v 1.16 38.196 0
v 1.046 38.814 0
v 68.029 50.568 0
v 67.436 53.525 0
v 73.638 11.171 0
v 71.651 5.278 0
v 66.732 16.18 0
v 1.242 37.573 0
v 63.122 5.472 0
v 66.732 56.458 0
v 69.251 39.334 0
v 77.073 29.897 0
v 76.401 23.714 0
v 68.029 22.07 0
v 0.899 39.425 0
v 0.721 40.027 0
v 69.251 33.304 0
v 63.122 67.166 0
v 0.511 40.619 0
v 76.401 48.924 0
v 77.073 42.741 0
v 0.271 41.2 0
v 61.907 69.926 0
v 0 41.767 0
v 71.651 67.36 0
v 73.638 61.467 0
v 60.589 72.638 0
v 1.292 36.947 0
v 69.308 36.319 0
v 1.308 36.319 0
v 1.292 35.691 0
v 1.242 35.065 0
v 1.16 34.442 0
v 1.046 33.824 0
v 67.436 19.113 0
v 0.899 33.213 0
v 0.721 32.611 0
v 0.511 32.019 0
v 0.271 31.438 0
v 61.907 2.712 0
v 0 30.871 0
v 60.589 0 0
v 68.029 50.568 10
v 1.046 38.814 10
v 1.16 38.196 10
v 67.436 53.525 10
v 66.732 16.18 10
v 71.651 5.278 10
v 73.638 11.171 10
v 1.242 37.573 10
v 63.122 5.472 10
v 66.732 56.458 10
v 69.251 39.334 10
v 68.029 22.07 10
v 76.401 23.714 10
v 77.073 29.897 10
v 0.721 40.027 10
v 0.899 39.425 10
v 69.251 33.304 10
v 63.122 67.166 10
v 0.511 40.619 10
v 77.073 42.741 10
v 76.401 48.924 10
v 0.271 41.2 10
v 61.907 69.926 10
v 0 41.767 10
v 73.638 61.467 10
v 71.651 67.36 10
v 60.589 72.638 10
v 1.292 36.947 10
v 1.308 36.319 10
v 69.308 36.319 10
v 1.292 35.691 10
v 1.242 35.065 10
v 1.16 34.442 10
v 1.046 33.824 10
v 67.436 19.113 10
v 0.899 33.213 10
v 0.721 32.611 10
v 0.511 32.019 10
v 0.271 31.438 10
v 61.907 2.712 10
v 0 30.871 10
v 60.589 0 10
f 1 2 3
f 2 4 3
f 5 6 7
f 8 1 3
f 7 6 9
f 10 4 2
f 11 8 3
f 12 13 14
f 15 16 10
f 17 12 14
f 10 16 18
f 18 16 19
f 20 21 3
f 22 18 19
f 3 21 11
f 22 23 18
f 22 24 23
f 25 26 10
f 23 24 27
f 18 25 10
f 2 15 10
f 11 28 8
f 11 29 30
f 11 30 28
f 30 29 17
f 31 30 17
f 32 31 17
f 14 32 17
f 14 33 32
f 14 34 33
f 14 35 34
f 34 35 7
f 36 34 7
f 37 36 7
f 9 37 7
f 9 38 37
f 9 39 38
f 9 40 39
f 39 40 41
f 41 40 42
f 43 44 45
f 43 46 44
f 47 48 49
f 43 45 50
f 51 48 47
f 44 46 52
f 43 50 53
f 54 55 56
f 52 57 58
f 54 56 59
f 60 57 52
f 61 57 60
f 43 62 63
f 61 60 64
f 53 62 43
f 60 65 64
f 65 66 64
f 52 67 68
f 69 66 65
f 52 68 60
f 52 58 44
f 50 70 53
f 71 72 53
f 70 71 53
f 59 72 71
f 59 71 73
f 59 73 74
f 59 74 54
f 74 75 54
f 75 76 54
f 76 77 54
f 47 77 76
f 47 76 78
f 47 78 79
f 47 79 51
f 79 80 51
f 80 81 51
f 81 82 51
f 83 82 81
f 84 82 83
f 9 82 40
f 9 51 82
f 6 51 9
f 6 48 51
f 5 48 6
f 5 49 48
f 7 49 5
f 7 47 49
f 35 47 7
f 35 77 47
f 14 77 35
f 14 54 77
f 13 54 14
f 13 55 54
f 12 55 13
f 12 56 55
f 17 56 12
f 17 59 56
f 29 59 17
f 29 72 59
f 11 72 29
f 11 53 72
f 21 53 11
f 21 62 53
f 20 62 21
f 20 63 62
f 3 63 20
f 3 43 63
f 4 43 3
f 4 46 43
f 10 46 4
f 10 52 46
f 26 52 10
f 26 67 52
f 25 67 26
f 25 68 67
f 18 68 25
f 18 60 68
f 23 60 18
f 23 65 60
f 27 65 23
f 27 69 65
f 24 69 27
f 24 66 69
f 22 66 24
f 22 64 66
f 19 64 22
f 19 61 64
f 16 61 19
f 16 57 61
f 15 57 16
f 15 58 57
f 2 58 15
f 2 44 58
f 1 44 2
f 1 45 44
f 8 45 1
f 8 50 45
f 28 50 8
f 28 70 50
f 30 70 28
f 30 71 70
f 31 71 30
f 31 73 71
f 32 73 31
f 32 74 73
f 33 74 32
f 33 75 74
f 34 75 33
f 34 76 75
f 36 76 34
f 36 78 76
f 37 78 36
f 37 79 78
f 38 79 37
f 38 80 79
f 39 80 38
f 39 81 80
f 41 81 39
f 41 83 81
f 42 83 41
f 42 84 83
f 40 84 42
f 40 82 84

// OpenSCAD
$fn = 32;

// ----------------------------------------------------------------------
// Gear sector: 4 teeth on 54 degrees
// ----------------------------------------------------------------------

// --- parameters (mm) ---
sector_angle = 54;        // sector angle, degrees
root_r = 80;              // root circle radius
tooth_h = 8;              // tooth height over the root circle
teeth = 4;                // number of teeth on the sector
hub_r = 12;               // hub bore radius
plate_t = 10;             // sector thickness, Z
arc_step = 3;             // sampling step of the root/hub arcs, degrees

tip_r = root_r + tooth_h;  // tip circle radius

profile = [[60.589, 0], [61.907, 2.712], [63.122, 5.472], [71.651, 5.278], [73.638, 11.171], [66.732, 16.18], [67.436, 19.113], [68.029, 22.07], [76.401, 23.714], [77.073, 29.897], [69.251, 33.304], [69.308, 36.319], [69.251, 39.334], [77.073, 42.741], [76.401, 48.924], [68.029, 50.568], [67.436, 53.525], [66.732, 56.458], [73.638, 61.467], [71.651, 67.36], [63.122, 67.166], [61.907, 69.926], [60.589, 72.638], [0, 41.767], [0.271, 41.2], [0.511, 40.619], [0.721, 40.027], [0.899, 39.425], [1.046, 38.814], [1.16, 38.196], [1.242, 37.573], [1.292, 36.947], [1.308, 36.319], [1.292, 35.691], [1.242, 35.065], [1.16, 34.442], [1.046, 33.824], [0.899, 33.213], [0.721, 32.611], [0.511, 32.019], [0.271, 31.438], [0, 30.871]];  // primary outline, 42 points, counter clockwise

// --- the one profile operation ---
linear_extrude(height = plate_t) polygon(points = profile);
